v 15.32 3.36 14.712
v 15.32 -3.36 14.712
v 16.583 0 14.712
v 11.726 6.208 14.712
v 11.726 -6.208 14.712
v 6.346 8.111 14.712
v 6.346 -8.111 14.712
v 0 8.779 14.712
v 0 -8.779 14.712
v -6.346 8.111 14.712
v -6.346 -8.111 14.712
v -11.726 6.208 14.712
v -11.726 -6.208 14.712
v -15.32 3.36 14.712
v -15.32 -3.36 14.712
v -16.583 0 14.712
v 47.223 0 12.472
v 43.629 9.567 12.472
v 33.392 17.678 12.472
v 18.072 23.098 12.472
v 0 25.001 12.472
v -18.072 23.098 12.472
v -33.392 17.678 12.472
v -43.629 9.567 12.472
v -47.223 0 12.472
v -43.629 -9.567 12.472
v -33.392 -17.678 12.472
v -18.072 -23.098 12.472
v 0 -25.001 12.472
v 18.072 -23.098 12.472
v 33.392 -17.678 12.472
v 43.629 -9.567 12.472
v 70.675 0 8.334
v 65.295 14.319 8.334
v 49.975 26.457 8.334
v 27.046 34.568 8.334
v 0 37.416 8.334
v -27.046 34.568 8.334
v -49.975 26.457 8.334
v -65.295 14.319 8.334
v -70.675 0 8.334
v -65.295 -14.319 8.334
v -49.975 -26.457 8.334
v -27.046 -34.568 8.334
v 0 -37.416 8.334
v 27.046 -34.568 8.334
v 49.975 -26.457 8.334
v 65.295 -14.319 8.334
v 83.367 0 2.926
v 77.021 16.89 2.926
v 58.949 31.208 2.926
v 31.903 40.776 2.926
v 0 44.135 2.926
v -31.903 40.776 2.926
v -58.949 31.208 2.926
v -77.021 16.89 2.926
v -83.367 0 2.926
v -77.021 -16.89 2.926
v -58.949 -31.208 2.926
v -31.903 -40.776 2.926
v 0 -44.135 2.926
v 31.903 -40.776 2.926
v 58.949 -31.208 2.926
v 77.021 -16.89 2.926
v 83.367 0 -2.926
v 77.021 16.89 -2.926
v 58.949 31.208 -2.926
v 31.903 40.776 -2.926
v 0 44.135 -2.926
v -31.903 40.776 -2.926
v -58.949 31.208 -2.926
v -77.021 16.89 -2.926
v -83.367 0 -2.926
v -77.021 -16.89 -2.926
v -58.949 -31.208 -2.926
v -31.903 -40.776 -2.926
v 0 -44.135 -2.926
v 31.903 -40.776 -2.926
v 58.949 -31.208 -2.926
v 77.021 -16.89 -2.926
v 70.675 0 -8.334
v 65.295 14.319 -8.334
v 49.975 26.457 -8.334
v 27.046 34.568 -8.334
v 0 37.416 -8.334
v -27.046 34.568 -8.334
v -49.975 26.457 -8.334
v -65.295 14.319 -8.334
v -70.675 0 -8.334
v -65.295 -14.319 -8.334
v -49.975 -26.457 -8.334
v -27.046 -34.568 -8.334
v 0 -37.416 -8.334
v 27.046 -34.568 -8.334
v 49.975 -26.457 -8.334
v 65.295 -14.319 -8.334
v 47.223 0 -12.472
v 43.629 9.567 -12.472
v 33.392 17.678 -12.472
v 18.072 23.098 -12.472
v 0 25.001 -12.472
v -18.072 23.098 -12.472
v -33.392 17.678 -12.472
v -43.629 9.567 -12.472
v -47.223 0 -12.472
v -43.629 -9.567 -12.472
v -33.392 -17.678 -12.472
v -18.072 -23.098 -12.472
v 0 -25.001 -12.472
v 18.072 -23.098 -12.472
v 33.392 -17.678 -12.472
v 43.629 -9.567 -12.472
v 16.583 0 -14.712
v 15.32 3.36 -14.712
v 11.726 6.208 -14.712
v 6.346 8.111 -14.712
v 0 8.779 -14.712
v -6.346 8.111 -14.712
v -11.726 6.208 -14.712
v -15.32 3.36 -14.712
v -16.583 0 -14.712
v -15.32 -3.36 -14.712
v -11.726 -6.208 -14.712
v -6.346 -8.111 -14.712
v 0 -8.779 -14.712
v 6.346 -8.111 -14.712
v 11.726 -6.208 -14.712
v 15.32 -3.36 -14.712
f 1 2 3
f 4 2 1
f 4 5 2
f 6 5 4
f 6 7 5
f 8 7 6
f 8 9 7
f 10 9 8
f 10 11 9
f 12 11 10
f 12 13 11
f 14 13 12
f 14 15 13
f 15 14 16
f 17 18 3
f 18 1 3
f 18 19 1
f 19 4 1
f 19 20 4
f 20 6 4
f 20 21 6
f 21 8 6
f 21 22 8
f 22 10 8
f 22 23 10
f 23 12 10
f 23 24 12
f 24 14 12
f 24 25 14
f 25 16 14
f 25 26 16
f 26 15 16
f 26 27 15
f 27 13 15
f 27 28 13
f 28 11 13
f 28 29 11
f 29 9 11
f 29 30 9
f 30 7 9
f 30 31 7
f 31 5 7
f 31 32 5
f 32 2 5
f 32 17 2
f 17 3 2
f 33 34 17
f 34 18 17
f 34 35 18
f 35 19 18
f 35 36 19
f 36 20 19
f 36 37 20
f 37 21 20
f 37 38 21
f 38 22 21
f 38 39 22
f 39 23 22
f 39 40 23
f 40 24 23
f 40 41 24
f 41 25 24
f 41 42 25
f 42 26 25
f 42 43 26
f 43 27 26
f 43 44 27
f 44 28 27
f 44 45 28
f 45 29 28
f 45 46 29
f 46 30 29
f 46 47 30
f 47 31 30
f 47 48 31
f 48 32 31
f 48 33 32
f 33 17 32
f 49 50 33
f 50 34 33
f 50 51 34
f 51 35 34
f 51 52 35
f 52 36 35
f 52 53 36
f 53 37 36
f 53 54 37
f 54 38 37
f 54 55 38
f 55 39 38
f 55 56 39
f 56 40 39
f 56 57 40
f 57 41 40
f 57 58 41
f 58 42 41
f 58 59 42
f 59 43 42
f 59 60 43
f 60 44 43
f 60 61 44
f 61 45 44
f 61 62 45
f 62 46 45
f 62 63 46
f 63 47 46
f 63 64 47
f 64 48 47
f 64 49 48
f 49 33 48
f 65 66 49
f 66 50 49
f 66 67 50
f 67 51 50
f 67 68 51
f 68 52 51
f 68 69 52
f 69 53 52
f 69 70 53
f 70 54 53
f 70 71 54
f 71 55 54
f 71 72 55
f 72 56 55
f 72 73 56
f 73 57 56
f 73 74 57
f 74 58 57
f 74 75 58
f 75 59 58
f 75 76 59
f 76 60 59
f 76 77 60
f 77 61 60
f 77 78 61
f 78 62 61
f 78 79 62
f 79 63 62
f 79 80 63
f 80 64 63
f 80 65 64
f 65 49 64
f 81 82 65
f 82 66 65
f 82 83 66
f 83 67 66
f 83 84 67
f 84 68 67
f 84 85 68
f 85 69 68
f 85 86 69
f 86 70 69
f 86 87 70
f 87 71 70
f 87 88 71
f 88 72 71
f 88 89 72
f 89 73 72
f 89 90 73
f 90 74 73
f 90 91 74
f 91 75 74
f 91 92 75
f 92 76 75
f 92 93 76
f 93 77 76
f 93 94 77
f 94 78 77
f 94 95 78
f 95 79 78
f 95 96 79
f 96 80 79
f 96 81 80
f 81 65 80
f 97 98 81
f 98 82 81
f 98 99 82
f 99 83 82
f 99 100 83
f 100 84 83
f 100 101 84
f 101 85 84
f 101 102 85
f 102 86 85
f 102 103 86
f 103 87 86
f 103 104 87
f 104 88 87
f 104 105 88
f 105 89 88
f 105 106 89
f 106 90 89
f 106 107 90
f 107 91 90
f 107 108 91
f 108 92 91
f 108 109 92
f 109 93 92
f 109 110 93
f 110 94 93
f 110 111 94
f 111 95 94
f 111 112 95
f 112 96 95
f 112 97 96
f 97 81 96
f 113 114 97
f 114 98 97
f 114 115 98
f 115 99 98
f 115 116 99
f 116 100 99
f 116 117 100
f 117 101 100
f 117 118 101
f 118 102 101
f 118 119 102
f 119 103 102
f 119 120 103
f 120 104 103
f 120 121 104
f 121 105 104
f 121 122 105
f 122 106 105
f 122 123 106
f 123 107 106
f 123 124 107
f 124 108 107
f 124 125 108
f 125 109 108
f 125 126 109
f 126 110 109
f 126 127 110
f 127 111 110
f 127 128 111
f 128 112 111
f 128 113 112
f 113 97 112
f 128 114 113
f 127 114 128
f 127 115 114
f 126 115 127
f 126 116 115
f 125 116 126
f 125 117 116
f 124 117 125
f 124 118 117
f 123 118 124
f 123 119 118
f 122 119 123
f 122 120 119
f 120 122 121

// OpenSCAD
// Generated by SolidPython 1.0.1 on 2020-07-29 00:46:53


scale(v = [17, 9, 3]) {
	sphere(r = 5);
}
/***********************************************
*********      SolidPython code:      **********
************************************************
 
# import packages: SolidPython
from solid import *
from solid.utils import *
from itertools import chain, combinations, permutations


class Resize:

    def __init__(self, scad_file):
        self.scad_file = scad_file
        #self.scad_file = import_scad(scad_file)
        # cone/cylinder param:
        self.r1 = 0
        self.r2 = 0
        self.h = 0
        # rectangular prism param:
        self.w = 0
        self.l = 0
        # ellipse param:
        self.r = 0

    # import OpenScad code (file name corresponds to shape)


    # classify shape + parameters
    def assign(self, param1, param2, param3):
        if self.scad_file == 'cone.scad':
            self.r1 = param1
            self.r2 = param2
            self.h = param3
        elif self.scad_file == 'cylinder.scad':
            self.r1 = param1
            self.r2 = param2
            self.h = param3
        elif self.scad_file == 'rectangularPrism.scad':
            self.h = param1
            self.l = param2
            self.w = param3
        else:
            self.r = param1
            self.h = param2

    # resize parameters
    def iterate(self):
        x = range(3, 20, 2)
        i = 1
        if self.scad_file == 'cone.scad':
            tempList = list(permutations(x, 2))
            for temp in tempList:
                param1 = temp[0]
                param2 = temp[1]
                filepath = 'produced_scad_files/' + 'cone' + str(param1) + '_' + str(param2) + '_' + '.scad'
                scad_render_to_file(cylinder(h=param1, r1=param2, r2=0), filepath)

        elif self.scad_file == 'cylinder.scad':
            tempList = list(permutations(x, 3))
            for temp in tempList:
                param1 = temp[0]
                param2 = temp[1]
                filepath = 'produced_scad_files/' + 'cylinder' + str(param1) + '_' + str(param2) + '_' + '.scad'
                scad_render_to_file(cylinder(h=param1, r1=param2, r2=param2), filepath)

        elif self.scad_file == 'rectangularPrism.scad':
            tempList = list(permutations(x, 3))
            for temp in tempList:
                param1 = temp[0]
                param2 = temp[1]
                param3 = temp[2]
                filepath = 'produced_scad_files/' + 'rectangularPrism' + str(param1) + '_' + str(param2) + '_' + str(
                    param3) + '.scad'
                scad_render_to_file(cube(size=(param1, param2, param3)), filepath)

        elif self.scad_file == 'ellipse.scad':
            tempList = list(permutations(x, 4))
            for temp in tempList:
                param1 = temp[0]
                param2 = temp[1]
                param3 = temp[2]
                param4 = temp[3]
                filepath = 'produced_scad_files/' + 'ellipse' + str(param1) + '_' + str(param2) + '_' + str(param3) + '_' + str(param4) + '.scad'
                scad_render_to_file(scale([param1, param2, param3])(sphere(r=param4)), filepath)

    def render_to_scadfile(self):
        scad_render_to_file(scad, 'example.scad') 
 
************************************************/
